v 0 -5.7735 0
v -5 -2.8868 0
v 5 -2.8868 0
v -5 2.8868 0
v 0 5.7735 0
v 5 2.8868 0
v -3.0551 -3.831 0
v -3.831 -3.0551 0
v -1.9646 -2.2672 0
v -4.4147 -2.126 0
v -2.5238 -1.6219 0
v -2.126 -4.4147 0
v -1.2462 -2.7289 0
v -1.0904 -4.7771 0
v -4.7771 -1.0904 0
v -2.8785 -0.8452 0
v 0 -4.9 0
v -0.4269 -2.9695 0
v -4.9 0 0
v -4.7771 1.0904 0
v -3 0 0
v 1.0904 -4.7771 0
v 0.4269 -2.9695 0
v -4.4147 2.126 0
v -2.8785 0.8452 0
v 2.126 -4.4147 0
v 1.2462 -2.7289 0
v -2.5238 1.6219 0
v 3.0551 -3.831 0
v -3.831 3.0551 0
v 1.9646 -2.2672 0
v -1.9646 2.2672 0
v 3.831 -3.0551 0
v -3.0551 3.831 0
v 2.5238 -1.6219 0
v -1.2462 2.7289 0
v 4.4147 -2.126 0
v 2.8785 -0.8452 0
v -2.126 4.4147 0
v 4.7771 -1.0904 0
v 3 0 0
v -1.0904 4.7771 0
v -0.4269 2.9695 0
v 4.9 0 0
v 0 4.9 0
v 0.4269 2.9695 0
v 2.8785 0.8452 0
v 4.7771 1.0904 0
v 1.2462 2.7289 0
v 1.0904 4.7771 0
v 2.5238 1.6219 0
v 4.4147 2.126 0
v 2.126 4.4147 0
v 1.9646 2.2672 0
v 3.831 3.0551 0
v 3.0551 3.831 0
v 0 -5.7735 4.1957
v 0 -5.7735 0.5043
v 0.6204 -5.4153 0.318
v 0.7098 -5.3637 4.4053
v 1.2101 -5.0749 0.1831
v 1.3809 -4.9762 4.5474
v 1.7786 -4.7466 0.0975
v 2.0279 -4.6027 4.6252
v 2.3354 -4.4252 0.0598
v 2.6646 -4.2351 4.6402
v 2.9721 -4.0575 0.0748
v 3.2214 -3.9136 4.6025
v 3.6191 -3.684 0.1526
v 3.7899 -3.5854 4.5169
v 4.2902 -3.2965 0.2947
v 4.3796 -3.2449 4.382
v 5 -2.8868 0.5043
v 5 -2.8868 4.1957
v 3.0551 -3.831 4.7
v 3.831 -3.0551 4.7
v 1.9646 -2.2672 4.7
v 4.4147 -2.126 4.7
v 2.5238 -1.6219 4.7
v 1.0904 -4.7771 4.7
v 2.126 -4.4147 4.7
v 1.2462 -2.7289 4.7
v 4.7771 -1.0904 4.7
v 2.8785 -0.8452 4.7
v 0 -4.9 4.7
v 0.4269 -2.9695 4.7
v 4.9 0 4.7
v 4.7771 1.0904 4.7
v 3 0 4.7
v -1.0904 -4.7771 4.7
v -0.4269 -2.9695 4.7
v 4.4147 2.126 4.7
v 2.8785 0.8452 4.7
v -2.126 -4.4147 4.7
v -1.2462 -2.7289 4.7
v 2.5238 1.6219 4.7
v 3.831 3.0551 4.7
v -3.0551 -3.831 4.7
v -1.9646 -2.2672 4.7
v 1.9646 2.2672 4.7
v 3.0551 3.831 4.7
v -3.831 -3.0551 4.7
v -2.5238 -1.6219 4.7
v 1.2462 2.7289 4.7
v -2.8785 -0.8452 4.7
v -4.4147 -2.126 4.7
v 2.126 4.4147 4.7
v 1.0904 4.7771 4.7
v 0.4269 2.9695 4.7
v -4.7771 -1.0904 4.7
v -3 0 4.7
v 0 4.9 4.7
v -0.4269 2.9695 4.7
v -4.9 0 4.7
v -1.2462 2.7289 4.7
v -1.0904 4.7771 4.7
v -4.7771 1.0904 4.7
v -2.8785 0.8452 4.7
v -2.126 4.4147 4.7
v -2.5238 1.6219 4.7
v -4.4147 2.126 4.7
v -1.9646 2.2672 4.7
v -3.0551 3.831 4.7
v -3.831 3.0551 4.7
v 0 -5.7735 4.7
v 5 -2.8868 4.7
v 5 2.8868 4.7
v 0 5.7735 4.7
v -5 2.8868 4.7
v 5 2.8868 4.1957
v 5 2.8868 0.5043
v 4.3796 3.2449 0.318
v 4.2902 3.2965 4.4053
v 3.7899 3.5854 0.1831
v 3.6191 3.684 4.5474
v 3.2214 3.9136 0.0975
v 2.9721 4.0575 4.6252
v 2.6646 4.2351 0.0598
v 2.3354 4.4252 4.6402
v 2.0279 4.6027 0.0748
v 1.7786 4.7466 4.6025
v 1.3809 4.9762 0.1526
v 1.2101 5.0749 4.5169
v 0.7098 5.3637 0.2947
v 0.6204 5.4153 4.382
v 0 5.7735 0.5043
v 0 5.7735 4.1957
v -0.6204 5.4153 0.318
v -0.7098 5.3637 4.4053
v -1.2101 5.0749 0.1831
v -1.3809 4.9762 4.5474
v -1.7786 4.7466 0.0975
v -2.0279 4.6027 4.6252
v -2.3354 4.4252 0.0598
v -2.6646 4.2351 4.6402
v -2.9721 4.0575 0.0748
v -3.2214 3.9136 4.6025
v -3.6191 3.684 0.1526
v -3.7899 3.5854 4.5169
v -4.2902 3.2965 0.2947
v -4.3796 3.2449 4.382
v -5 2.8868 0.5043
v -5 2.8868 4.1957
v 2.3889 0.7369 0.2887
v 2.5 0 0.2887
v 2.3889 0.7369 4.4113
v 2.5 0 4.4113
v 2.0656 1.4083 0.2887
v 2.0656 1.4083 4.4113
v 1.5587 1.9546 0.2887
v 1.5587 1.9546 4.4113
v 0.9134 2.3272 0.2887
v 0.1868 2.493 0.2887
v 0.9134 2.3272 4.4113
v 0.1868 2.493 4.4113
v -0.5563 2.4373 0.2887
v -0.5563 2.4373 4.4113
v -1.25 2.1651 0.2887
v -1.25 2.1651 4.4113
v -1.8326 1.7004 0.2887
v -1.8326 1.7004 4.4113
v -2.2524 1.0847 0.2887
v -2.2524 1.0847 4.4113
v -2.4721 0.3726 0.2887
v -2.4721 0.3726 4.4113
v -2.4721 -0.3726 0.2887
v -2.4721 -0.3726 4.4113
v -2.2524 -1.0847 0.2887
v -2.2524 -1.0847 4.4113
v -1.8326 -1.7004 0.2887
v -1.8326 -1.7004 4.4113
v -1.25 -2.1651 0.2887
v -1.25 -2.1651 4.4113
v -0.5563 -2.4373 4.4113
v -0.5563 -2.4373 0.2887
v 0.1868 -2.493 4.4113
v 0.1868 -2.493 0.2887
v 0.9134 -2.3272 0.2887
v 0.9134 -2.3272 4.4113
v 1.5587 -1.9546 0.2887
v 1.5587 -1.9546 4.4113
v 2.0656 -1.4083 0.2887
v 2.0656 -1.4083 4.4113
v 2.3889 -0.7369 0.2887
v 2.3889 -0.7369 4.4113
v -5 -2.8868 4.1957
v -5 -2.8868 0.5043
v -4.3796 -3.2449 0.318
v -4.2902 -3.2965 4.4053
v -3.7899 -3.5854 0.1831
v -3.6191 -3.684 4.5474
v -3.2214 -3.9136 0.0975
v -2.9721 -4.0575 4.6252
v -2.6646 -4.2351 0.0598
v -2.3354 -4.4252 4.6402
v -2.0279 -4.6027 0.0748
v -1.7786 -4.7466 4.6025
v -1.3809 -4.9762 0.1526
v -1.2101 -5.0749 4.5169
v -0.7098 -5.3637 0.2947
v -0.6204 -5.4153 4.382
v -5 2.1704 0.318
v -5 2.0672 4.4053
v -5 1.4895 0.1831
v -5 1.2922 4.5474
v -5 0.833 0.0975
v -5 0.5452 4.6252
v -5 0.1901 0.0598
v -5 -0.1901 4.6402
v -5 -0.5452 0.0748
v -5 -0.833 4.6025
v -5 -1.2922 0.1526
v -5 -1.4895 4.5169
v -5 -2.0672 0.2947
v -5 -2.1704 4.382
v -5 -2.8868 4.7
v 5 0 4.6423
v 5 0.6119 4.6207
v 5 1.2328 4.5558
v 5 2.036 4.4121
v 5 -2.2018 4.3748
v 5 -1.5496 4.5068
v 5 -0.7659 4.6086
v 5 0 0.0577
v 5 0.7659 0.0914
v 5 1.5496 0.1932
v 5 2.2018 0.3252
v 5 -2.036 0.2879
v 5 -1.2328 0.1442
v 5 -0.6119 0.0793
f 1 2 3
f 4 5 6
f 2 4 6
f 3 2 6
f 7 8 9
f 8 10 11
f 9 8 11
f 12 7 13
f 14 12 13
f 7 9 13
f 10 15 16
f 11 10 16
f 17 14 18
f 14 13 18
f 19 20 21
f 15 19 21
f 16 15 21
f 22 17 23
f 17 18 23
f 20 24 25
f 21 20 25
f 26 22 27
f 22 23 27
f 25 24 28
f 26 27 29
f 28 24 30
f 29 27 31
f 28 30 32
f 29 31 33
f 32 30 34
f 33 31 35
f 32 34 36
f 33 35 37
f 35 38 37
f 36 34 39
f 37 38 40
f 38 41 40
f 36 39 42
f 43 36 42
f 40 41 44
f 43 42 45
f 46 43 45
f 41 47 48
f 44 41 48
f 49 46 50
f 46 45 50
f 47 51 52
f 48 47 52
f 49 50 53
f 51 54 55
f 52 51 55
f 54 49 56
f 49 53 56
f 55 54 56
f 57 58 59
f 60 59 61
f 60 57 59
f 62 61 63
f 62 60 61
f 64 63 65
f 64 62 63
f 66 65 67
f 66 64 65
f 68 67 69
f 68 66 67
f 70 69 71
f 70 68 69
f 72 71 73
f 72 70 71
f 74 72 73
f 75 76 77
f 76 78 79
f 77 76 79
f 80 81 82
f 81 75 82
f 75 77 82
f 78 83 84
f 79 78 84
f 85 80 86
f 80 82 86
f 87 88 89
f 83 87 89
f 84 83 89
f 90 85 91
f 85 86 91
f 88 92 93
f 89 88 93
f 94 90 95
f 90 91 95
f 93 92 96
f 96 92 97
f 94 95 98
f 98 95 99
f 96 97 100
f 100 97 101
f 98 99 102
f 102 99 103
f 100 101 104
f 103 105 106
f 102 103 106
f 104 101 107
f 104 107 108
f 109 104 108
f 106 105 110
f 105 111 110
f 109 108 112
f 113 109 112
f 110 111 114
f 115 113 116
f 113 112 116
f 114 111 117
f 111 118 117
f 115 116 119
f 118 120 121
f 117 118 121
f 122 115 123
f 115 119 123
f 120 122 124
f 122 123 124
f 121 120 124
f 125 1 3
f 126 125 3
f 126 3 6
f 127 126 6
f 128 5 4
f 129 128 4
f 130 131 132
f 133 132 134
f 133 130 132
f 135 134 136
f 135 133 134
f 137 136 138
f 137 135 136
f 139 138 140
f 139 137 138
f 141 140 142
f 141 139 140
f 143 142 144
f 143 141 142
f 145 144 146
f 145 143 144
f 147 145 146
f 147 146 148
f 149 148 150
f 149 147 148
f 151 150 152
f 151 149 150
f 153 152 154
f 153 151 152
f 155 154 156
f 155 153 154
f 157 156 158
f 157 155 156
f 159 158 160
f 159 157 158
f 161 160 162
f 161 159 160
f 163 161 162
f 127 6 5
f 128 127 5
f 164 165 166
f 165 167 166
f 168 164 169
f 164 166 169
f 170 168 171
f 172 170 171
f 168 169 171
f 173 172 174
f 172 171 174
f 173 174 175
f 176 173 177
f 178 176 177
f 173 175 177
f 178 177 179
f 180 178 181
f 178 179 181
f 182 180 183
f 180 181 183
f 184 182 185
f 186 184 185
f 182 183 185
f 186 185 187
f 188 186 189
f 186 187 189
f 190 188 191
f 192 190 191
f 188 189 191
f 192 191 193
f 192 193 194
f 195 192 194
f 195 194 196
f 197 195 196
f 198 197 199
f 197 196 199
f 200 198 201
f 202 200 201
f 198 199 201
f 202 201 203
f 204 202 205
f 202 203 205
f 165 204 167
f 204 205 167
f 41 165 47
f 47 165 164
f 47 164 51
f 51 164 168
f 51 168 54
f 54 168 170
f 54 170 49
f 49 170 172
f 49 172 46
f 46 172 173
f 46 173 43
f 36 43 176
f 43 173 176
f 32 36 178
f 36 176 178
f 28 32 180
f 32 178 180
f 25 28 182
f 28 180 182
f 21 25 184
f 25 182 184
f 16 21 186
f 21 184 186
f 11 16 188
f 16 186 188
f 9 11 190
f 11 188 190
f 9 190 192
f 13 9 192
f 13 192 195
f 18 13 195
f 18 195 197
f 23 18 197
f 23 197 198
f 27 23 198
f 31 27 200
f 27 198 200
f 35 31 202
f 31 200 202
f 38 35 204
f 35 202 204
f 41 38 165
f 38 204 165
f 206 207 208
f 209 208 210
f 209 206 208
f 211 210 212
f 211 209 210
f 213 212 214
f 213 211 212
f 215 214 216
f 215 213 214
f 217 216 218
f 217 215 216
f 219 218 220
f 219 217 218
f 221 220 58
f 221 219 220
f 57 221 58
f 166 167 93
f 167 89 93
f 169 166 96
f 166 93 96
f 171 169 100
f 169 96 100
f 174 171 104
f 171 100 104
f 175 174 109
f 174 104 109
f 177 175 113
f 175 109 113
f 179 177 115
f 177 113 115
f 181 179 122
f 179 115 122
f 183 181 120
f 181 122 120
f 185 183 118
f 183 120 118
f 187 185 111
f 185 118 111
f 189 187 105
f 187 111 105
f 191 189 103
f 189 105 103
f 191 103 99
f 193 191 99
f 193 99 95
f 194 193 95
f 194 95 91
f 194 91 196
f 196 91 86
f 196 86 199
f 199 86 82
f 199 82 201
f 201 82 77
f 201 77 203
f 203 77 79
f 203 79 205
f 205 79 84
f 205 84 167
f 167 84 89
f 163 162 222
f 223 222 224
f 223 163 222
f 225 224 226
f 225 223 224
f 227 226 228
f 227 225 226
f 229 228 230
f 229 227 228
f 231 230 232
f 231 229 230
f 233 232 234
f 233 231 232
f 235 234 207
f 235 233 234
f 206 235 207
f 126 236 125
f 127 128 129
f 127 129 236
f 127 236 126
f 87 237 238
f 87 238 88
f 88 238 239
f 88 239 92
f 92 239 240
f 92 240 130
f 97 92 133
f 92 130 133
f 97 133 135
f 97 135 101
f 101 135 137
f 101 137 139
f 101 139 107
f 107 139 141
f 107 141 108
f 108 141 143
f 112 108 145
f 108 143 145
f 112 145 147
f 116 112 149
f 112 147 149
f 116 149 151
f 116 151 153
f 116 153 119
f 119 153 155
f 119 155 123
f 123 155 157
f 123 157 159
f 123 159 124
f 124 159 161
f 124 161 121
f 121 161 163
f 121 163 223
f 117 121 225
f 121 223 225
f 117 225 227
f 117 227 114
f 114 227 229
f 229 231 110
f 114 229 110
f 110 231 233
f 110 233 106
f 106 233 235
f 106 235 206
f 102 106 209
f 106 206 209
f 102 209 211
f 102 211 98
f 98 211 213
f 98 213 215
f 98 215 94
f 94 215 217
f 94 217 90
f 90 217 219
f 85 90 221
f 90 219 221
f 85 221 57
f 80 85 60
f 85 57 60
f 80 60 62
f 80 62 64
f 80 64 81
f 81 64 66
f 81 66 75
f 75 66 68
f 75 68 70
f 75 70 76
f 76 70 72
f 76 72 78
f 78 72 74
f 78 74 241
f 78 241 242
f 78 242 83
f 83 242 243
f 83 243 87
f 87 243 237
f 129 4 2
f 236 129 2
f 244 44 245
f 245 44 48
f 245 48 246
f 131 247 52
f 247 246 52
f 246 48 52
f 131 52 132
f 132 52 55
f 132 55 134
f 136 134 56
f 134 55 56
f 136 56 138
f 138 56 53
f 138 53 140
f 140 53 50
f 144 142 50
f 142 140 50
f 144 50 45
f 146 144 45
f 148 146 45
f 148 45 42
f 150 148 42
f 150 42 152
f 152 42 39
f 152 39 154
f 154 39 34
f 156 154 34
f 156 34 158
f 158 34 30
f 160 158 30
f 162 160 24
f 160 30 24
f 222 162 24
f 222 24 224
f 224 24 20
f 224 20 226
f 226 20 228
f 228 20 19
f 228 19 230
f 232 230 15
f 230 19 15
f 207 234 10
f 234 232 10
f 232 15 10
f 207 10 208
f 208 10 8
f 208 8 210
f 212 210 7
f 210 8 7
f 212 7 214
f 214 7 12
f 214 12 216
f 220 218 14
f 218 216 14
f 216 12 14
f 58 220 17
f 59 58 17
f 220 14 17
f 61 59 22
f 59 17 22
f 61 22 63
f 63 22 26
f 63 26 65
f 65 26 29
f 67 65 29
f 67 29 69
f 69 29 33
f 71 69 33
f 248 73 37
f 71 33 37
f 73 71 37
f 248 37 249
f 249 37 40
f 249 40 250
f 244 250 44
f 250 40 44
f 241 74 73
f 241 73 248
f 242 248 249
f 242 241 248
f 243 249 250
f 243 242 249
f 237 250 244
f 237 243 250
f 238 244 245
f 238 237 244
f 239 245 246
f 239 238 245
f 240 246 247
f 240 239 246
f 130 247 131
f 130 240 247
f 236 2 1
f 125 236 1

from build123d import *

# Parameters (mm, degrees)
SKETCH001_R  = 7
POCKET_DEPTH = 4.701
PAD_DEPTH    = 4.7


with BuildPart() as sem_rosca:
    # Sketch → Revolution (revolve)
    with BuildSketch(Plane.XZ):
        Polygon((3, 0), (2.5, 0.288675), (2.5, 4.411325), (3, 4.7), (4.9, 4.7), (6, 4.064915), (6, 0.635085), (4.9, 0), align=None)
    revolve(axis=Axis((0, 0, 0), (0, 0, 1)))

    # Sketch001 (on Face4 of Revolution) → Pocket (cut, through all)
    with BuildSketch(Plane(origin=(0, 0, 4.7), x_dir=(-1, 0, 0), z_dir=(0, 0, 1))):
        Circle(SKETCH001_R)
        Polygon((0, -5.773503), (5, -2.886751), (5, 2.886751), (0, 5.773503), (-5, 2.886751), (-5, -2.886751), align=None, mode=Mode.SUBTRACT)
    extrude(amount=-POCKET_DEPTH, mode=Mode.SUBTRACT)


with BuildPart() as body001:
    # Sketch002 → Pad (new body)
    with BuildSketch(Plane.XY):
        Polygon((0, 5.773503), (-5, 2.886751), (-5, -2.886751), (0, -5.773503), (5, -2.886751), (5, 2.886751), align=None)
    extrude(amount=PAD_DEPTH)


solid = Compound([sem_rosca.part, body001.part])
